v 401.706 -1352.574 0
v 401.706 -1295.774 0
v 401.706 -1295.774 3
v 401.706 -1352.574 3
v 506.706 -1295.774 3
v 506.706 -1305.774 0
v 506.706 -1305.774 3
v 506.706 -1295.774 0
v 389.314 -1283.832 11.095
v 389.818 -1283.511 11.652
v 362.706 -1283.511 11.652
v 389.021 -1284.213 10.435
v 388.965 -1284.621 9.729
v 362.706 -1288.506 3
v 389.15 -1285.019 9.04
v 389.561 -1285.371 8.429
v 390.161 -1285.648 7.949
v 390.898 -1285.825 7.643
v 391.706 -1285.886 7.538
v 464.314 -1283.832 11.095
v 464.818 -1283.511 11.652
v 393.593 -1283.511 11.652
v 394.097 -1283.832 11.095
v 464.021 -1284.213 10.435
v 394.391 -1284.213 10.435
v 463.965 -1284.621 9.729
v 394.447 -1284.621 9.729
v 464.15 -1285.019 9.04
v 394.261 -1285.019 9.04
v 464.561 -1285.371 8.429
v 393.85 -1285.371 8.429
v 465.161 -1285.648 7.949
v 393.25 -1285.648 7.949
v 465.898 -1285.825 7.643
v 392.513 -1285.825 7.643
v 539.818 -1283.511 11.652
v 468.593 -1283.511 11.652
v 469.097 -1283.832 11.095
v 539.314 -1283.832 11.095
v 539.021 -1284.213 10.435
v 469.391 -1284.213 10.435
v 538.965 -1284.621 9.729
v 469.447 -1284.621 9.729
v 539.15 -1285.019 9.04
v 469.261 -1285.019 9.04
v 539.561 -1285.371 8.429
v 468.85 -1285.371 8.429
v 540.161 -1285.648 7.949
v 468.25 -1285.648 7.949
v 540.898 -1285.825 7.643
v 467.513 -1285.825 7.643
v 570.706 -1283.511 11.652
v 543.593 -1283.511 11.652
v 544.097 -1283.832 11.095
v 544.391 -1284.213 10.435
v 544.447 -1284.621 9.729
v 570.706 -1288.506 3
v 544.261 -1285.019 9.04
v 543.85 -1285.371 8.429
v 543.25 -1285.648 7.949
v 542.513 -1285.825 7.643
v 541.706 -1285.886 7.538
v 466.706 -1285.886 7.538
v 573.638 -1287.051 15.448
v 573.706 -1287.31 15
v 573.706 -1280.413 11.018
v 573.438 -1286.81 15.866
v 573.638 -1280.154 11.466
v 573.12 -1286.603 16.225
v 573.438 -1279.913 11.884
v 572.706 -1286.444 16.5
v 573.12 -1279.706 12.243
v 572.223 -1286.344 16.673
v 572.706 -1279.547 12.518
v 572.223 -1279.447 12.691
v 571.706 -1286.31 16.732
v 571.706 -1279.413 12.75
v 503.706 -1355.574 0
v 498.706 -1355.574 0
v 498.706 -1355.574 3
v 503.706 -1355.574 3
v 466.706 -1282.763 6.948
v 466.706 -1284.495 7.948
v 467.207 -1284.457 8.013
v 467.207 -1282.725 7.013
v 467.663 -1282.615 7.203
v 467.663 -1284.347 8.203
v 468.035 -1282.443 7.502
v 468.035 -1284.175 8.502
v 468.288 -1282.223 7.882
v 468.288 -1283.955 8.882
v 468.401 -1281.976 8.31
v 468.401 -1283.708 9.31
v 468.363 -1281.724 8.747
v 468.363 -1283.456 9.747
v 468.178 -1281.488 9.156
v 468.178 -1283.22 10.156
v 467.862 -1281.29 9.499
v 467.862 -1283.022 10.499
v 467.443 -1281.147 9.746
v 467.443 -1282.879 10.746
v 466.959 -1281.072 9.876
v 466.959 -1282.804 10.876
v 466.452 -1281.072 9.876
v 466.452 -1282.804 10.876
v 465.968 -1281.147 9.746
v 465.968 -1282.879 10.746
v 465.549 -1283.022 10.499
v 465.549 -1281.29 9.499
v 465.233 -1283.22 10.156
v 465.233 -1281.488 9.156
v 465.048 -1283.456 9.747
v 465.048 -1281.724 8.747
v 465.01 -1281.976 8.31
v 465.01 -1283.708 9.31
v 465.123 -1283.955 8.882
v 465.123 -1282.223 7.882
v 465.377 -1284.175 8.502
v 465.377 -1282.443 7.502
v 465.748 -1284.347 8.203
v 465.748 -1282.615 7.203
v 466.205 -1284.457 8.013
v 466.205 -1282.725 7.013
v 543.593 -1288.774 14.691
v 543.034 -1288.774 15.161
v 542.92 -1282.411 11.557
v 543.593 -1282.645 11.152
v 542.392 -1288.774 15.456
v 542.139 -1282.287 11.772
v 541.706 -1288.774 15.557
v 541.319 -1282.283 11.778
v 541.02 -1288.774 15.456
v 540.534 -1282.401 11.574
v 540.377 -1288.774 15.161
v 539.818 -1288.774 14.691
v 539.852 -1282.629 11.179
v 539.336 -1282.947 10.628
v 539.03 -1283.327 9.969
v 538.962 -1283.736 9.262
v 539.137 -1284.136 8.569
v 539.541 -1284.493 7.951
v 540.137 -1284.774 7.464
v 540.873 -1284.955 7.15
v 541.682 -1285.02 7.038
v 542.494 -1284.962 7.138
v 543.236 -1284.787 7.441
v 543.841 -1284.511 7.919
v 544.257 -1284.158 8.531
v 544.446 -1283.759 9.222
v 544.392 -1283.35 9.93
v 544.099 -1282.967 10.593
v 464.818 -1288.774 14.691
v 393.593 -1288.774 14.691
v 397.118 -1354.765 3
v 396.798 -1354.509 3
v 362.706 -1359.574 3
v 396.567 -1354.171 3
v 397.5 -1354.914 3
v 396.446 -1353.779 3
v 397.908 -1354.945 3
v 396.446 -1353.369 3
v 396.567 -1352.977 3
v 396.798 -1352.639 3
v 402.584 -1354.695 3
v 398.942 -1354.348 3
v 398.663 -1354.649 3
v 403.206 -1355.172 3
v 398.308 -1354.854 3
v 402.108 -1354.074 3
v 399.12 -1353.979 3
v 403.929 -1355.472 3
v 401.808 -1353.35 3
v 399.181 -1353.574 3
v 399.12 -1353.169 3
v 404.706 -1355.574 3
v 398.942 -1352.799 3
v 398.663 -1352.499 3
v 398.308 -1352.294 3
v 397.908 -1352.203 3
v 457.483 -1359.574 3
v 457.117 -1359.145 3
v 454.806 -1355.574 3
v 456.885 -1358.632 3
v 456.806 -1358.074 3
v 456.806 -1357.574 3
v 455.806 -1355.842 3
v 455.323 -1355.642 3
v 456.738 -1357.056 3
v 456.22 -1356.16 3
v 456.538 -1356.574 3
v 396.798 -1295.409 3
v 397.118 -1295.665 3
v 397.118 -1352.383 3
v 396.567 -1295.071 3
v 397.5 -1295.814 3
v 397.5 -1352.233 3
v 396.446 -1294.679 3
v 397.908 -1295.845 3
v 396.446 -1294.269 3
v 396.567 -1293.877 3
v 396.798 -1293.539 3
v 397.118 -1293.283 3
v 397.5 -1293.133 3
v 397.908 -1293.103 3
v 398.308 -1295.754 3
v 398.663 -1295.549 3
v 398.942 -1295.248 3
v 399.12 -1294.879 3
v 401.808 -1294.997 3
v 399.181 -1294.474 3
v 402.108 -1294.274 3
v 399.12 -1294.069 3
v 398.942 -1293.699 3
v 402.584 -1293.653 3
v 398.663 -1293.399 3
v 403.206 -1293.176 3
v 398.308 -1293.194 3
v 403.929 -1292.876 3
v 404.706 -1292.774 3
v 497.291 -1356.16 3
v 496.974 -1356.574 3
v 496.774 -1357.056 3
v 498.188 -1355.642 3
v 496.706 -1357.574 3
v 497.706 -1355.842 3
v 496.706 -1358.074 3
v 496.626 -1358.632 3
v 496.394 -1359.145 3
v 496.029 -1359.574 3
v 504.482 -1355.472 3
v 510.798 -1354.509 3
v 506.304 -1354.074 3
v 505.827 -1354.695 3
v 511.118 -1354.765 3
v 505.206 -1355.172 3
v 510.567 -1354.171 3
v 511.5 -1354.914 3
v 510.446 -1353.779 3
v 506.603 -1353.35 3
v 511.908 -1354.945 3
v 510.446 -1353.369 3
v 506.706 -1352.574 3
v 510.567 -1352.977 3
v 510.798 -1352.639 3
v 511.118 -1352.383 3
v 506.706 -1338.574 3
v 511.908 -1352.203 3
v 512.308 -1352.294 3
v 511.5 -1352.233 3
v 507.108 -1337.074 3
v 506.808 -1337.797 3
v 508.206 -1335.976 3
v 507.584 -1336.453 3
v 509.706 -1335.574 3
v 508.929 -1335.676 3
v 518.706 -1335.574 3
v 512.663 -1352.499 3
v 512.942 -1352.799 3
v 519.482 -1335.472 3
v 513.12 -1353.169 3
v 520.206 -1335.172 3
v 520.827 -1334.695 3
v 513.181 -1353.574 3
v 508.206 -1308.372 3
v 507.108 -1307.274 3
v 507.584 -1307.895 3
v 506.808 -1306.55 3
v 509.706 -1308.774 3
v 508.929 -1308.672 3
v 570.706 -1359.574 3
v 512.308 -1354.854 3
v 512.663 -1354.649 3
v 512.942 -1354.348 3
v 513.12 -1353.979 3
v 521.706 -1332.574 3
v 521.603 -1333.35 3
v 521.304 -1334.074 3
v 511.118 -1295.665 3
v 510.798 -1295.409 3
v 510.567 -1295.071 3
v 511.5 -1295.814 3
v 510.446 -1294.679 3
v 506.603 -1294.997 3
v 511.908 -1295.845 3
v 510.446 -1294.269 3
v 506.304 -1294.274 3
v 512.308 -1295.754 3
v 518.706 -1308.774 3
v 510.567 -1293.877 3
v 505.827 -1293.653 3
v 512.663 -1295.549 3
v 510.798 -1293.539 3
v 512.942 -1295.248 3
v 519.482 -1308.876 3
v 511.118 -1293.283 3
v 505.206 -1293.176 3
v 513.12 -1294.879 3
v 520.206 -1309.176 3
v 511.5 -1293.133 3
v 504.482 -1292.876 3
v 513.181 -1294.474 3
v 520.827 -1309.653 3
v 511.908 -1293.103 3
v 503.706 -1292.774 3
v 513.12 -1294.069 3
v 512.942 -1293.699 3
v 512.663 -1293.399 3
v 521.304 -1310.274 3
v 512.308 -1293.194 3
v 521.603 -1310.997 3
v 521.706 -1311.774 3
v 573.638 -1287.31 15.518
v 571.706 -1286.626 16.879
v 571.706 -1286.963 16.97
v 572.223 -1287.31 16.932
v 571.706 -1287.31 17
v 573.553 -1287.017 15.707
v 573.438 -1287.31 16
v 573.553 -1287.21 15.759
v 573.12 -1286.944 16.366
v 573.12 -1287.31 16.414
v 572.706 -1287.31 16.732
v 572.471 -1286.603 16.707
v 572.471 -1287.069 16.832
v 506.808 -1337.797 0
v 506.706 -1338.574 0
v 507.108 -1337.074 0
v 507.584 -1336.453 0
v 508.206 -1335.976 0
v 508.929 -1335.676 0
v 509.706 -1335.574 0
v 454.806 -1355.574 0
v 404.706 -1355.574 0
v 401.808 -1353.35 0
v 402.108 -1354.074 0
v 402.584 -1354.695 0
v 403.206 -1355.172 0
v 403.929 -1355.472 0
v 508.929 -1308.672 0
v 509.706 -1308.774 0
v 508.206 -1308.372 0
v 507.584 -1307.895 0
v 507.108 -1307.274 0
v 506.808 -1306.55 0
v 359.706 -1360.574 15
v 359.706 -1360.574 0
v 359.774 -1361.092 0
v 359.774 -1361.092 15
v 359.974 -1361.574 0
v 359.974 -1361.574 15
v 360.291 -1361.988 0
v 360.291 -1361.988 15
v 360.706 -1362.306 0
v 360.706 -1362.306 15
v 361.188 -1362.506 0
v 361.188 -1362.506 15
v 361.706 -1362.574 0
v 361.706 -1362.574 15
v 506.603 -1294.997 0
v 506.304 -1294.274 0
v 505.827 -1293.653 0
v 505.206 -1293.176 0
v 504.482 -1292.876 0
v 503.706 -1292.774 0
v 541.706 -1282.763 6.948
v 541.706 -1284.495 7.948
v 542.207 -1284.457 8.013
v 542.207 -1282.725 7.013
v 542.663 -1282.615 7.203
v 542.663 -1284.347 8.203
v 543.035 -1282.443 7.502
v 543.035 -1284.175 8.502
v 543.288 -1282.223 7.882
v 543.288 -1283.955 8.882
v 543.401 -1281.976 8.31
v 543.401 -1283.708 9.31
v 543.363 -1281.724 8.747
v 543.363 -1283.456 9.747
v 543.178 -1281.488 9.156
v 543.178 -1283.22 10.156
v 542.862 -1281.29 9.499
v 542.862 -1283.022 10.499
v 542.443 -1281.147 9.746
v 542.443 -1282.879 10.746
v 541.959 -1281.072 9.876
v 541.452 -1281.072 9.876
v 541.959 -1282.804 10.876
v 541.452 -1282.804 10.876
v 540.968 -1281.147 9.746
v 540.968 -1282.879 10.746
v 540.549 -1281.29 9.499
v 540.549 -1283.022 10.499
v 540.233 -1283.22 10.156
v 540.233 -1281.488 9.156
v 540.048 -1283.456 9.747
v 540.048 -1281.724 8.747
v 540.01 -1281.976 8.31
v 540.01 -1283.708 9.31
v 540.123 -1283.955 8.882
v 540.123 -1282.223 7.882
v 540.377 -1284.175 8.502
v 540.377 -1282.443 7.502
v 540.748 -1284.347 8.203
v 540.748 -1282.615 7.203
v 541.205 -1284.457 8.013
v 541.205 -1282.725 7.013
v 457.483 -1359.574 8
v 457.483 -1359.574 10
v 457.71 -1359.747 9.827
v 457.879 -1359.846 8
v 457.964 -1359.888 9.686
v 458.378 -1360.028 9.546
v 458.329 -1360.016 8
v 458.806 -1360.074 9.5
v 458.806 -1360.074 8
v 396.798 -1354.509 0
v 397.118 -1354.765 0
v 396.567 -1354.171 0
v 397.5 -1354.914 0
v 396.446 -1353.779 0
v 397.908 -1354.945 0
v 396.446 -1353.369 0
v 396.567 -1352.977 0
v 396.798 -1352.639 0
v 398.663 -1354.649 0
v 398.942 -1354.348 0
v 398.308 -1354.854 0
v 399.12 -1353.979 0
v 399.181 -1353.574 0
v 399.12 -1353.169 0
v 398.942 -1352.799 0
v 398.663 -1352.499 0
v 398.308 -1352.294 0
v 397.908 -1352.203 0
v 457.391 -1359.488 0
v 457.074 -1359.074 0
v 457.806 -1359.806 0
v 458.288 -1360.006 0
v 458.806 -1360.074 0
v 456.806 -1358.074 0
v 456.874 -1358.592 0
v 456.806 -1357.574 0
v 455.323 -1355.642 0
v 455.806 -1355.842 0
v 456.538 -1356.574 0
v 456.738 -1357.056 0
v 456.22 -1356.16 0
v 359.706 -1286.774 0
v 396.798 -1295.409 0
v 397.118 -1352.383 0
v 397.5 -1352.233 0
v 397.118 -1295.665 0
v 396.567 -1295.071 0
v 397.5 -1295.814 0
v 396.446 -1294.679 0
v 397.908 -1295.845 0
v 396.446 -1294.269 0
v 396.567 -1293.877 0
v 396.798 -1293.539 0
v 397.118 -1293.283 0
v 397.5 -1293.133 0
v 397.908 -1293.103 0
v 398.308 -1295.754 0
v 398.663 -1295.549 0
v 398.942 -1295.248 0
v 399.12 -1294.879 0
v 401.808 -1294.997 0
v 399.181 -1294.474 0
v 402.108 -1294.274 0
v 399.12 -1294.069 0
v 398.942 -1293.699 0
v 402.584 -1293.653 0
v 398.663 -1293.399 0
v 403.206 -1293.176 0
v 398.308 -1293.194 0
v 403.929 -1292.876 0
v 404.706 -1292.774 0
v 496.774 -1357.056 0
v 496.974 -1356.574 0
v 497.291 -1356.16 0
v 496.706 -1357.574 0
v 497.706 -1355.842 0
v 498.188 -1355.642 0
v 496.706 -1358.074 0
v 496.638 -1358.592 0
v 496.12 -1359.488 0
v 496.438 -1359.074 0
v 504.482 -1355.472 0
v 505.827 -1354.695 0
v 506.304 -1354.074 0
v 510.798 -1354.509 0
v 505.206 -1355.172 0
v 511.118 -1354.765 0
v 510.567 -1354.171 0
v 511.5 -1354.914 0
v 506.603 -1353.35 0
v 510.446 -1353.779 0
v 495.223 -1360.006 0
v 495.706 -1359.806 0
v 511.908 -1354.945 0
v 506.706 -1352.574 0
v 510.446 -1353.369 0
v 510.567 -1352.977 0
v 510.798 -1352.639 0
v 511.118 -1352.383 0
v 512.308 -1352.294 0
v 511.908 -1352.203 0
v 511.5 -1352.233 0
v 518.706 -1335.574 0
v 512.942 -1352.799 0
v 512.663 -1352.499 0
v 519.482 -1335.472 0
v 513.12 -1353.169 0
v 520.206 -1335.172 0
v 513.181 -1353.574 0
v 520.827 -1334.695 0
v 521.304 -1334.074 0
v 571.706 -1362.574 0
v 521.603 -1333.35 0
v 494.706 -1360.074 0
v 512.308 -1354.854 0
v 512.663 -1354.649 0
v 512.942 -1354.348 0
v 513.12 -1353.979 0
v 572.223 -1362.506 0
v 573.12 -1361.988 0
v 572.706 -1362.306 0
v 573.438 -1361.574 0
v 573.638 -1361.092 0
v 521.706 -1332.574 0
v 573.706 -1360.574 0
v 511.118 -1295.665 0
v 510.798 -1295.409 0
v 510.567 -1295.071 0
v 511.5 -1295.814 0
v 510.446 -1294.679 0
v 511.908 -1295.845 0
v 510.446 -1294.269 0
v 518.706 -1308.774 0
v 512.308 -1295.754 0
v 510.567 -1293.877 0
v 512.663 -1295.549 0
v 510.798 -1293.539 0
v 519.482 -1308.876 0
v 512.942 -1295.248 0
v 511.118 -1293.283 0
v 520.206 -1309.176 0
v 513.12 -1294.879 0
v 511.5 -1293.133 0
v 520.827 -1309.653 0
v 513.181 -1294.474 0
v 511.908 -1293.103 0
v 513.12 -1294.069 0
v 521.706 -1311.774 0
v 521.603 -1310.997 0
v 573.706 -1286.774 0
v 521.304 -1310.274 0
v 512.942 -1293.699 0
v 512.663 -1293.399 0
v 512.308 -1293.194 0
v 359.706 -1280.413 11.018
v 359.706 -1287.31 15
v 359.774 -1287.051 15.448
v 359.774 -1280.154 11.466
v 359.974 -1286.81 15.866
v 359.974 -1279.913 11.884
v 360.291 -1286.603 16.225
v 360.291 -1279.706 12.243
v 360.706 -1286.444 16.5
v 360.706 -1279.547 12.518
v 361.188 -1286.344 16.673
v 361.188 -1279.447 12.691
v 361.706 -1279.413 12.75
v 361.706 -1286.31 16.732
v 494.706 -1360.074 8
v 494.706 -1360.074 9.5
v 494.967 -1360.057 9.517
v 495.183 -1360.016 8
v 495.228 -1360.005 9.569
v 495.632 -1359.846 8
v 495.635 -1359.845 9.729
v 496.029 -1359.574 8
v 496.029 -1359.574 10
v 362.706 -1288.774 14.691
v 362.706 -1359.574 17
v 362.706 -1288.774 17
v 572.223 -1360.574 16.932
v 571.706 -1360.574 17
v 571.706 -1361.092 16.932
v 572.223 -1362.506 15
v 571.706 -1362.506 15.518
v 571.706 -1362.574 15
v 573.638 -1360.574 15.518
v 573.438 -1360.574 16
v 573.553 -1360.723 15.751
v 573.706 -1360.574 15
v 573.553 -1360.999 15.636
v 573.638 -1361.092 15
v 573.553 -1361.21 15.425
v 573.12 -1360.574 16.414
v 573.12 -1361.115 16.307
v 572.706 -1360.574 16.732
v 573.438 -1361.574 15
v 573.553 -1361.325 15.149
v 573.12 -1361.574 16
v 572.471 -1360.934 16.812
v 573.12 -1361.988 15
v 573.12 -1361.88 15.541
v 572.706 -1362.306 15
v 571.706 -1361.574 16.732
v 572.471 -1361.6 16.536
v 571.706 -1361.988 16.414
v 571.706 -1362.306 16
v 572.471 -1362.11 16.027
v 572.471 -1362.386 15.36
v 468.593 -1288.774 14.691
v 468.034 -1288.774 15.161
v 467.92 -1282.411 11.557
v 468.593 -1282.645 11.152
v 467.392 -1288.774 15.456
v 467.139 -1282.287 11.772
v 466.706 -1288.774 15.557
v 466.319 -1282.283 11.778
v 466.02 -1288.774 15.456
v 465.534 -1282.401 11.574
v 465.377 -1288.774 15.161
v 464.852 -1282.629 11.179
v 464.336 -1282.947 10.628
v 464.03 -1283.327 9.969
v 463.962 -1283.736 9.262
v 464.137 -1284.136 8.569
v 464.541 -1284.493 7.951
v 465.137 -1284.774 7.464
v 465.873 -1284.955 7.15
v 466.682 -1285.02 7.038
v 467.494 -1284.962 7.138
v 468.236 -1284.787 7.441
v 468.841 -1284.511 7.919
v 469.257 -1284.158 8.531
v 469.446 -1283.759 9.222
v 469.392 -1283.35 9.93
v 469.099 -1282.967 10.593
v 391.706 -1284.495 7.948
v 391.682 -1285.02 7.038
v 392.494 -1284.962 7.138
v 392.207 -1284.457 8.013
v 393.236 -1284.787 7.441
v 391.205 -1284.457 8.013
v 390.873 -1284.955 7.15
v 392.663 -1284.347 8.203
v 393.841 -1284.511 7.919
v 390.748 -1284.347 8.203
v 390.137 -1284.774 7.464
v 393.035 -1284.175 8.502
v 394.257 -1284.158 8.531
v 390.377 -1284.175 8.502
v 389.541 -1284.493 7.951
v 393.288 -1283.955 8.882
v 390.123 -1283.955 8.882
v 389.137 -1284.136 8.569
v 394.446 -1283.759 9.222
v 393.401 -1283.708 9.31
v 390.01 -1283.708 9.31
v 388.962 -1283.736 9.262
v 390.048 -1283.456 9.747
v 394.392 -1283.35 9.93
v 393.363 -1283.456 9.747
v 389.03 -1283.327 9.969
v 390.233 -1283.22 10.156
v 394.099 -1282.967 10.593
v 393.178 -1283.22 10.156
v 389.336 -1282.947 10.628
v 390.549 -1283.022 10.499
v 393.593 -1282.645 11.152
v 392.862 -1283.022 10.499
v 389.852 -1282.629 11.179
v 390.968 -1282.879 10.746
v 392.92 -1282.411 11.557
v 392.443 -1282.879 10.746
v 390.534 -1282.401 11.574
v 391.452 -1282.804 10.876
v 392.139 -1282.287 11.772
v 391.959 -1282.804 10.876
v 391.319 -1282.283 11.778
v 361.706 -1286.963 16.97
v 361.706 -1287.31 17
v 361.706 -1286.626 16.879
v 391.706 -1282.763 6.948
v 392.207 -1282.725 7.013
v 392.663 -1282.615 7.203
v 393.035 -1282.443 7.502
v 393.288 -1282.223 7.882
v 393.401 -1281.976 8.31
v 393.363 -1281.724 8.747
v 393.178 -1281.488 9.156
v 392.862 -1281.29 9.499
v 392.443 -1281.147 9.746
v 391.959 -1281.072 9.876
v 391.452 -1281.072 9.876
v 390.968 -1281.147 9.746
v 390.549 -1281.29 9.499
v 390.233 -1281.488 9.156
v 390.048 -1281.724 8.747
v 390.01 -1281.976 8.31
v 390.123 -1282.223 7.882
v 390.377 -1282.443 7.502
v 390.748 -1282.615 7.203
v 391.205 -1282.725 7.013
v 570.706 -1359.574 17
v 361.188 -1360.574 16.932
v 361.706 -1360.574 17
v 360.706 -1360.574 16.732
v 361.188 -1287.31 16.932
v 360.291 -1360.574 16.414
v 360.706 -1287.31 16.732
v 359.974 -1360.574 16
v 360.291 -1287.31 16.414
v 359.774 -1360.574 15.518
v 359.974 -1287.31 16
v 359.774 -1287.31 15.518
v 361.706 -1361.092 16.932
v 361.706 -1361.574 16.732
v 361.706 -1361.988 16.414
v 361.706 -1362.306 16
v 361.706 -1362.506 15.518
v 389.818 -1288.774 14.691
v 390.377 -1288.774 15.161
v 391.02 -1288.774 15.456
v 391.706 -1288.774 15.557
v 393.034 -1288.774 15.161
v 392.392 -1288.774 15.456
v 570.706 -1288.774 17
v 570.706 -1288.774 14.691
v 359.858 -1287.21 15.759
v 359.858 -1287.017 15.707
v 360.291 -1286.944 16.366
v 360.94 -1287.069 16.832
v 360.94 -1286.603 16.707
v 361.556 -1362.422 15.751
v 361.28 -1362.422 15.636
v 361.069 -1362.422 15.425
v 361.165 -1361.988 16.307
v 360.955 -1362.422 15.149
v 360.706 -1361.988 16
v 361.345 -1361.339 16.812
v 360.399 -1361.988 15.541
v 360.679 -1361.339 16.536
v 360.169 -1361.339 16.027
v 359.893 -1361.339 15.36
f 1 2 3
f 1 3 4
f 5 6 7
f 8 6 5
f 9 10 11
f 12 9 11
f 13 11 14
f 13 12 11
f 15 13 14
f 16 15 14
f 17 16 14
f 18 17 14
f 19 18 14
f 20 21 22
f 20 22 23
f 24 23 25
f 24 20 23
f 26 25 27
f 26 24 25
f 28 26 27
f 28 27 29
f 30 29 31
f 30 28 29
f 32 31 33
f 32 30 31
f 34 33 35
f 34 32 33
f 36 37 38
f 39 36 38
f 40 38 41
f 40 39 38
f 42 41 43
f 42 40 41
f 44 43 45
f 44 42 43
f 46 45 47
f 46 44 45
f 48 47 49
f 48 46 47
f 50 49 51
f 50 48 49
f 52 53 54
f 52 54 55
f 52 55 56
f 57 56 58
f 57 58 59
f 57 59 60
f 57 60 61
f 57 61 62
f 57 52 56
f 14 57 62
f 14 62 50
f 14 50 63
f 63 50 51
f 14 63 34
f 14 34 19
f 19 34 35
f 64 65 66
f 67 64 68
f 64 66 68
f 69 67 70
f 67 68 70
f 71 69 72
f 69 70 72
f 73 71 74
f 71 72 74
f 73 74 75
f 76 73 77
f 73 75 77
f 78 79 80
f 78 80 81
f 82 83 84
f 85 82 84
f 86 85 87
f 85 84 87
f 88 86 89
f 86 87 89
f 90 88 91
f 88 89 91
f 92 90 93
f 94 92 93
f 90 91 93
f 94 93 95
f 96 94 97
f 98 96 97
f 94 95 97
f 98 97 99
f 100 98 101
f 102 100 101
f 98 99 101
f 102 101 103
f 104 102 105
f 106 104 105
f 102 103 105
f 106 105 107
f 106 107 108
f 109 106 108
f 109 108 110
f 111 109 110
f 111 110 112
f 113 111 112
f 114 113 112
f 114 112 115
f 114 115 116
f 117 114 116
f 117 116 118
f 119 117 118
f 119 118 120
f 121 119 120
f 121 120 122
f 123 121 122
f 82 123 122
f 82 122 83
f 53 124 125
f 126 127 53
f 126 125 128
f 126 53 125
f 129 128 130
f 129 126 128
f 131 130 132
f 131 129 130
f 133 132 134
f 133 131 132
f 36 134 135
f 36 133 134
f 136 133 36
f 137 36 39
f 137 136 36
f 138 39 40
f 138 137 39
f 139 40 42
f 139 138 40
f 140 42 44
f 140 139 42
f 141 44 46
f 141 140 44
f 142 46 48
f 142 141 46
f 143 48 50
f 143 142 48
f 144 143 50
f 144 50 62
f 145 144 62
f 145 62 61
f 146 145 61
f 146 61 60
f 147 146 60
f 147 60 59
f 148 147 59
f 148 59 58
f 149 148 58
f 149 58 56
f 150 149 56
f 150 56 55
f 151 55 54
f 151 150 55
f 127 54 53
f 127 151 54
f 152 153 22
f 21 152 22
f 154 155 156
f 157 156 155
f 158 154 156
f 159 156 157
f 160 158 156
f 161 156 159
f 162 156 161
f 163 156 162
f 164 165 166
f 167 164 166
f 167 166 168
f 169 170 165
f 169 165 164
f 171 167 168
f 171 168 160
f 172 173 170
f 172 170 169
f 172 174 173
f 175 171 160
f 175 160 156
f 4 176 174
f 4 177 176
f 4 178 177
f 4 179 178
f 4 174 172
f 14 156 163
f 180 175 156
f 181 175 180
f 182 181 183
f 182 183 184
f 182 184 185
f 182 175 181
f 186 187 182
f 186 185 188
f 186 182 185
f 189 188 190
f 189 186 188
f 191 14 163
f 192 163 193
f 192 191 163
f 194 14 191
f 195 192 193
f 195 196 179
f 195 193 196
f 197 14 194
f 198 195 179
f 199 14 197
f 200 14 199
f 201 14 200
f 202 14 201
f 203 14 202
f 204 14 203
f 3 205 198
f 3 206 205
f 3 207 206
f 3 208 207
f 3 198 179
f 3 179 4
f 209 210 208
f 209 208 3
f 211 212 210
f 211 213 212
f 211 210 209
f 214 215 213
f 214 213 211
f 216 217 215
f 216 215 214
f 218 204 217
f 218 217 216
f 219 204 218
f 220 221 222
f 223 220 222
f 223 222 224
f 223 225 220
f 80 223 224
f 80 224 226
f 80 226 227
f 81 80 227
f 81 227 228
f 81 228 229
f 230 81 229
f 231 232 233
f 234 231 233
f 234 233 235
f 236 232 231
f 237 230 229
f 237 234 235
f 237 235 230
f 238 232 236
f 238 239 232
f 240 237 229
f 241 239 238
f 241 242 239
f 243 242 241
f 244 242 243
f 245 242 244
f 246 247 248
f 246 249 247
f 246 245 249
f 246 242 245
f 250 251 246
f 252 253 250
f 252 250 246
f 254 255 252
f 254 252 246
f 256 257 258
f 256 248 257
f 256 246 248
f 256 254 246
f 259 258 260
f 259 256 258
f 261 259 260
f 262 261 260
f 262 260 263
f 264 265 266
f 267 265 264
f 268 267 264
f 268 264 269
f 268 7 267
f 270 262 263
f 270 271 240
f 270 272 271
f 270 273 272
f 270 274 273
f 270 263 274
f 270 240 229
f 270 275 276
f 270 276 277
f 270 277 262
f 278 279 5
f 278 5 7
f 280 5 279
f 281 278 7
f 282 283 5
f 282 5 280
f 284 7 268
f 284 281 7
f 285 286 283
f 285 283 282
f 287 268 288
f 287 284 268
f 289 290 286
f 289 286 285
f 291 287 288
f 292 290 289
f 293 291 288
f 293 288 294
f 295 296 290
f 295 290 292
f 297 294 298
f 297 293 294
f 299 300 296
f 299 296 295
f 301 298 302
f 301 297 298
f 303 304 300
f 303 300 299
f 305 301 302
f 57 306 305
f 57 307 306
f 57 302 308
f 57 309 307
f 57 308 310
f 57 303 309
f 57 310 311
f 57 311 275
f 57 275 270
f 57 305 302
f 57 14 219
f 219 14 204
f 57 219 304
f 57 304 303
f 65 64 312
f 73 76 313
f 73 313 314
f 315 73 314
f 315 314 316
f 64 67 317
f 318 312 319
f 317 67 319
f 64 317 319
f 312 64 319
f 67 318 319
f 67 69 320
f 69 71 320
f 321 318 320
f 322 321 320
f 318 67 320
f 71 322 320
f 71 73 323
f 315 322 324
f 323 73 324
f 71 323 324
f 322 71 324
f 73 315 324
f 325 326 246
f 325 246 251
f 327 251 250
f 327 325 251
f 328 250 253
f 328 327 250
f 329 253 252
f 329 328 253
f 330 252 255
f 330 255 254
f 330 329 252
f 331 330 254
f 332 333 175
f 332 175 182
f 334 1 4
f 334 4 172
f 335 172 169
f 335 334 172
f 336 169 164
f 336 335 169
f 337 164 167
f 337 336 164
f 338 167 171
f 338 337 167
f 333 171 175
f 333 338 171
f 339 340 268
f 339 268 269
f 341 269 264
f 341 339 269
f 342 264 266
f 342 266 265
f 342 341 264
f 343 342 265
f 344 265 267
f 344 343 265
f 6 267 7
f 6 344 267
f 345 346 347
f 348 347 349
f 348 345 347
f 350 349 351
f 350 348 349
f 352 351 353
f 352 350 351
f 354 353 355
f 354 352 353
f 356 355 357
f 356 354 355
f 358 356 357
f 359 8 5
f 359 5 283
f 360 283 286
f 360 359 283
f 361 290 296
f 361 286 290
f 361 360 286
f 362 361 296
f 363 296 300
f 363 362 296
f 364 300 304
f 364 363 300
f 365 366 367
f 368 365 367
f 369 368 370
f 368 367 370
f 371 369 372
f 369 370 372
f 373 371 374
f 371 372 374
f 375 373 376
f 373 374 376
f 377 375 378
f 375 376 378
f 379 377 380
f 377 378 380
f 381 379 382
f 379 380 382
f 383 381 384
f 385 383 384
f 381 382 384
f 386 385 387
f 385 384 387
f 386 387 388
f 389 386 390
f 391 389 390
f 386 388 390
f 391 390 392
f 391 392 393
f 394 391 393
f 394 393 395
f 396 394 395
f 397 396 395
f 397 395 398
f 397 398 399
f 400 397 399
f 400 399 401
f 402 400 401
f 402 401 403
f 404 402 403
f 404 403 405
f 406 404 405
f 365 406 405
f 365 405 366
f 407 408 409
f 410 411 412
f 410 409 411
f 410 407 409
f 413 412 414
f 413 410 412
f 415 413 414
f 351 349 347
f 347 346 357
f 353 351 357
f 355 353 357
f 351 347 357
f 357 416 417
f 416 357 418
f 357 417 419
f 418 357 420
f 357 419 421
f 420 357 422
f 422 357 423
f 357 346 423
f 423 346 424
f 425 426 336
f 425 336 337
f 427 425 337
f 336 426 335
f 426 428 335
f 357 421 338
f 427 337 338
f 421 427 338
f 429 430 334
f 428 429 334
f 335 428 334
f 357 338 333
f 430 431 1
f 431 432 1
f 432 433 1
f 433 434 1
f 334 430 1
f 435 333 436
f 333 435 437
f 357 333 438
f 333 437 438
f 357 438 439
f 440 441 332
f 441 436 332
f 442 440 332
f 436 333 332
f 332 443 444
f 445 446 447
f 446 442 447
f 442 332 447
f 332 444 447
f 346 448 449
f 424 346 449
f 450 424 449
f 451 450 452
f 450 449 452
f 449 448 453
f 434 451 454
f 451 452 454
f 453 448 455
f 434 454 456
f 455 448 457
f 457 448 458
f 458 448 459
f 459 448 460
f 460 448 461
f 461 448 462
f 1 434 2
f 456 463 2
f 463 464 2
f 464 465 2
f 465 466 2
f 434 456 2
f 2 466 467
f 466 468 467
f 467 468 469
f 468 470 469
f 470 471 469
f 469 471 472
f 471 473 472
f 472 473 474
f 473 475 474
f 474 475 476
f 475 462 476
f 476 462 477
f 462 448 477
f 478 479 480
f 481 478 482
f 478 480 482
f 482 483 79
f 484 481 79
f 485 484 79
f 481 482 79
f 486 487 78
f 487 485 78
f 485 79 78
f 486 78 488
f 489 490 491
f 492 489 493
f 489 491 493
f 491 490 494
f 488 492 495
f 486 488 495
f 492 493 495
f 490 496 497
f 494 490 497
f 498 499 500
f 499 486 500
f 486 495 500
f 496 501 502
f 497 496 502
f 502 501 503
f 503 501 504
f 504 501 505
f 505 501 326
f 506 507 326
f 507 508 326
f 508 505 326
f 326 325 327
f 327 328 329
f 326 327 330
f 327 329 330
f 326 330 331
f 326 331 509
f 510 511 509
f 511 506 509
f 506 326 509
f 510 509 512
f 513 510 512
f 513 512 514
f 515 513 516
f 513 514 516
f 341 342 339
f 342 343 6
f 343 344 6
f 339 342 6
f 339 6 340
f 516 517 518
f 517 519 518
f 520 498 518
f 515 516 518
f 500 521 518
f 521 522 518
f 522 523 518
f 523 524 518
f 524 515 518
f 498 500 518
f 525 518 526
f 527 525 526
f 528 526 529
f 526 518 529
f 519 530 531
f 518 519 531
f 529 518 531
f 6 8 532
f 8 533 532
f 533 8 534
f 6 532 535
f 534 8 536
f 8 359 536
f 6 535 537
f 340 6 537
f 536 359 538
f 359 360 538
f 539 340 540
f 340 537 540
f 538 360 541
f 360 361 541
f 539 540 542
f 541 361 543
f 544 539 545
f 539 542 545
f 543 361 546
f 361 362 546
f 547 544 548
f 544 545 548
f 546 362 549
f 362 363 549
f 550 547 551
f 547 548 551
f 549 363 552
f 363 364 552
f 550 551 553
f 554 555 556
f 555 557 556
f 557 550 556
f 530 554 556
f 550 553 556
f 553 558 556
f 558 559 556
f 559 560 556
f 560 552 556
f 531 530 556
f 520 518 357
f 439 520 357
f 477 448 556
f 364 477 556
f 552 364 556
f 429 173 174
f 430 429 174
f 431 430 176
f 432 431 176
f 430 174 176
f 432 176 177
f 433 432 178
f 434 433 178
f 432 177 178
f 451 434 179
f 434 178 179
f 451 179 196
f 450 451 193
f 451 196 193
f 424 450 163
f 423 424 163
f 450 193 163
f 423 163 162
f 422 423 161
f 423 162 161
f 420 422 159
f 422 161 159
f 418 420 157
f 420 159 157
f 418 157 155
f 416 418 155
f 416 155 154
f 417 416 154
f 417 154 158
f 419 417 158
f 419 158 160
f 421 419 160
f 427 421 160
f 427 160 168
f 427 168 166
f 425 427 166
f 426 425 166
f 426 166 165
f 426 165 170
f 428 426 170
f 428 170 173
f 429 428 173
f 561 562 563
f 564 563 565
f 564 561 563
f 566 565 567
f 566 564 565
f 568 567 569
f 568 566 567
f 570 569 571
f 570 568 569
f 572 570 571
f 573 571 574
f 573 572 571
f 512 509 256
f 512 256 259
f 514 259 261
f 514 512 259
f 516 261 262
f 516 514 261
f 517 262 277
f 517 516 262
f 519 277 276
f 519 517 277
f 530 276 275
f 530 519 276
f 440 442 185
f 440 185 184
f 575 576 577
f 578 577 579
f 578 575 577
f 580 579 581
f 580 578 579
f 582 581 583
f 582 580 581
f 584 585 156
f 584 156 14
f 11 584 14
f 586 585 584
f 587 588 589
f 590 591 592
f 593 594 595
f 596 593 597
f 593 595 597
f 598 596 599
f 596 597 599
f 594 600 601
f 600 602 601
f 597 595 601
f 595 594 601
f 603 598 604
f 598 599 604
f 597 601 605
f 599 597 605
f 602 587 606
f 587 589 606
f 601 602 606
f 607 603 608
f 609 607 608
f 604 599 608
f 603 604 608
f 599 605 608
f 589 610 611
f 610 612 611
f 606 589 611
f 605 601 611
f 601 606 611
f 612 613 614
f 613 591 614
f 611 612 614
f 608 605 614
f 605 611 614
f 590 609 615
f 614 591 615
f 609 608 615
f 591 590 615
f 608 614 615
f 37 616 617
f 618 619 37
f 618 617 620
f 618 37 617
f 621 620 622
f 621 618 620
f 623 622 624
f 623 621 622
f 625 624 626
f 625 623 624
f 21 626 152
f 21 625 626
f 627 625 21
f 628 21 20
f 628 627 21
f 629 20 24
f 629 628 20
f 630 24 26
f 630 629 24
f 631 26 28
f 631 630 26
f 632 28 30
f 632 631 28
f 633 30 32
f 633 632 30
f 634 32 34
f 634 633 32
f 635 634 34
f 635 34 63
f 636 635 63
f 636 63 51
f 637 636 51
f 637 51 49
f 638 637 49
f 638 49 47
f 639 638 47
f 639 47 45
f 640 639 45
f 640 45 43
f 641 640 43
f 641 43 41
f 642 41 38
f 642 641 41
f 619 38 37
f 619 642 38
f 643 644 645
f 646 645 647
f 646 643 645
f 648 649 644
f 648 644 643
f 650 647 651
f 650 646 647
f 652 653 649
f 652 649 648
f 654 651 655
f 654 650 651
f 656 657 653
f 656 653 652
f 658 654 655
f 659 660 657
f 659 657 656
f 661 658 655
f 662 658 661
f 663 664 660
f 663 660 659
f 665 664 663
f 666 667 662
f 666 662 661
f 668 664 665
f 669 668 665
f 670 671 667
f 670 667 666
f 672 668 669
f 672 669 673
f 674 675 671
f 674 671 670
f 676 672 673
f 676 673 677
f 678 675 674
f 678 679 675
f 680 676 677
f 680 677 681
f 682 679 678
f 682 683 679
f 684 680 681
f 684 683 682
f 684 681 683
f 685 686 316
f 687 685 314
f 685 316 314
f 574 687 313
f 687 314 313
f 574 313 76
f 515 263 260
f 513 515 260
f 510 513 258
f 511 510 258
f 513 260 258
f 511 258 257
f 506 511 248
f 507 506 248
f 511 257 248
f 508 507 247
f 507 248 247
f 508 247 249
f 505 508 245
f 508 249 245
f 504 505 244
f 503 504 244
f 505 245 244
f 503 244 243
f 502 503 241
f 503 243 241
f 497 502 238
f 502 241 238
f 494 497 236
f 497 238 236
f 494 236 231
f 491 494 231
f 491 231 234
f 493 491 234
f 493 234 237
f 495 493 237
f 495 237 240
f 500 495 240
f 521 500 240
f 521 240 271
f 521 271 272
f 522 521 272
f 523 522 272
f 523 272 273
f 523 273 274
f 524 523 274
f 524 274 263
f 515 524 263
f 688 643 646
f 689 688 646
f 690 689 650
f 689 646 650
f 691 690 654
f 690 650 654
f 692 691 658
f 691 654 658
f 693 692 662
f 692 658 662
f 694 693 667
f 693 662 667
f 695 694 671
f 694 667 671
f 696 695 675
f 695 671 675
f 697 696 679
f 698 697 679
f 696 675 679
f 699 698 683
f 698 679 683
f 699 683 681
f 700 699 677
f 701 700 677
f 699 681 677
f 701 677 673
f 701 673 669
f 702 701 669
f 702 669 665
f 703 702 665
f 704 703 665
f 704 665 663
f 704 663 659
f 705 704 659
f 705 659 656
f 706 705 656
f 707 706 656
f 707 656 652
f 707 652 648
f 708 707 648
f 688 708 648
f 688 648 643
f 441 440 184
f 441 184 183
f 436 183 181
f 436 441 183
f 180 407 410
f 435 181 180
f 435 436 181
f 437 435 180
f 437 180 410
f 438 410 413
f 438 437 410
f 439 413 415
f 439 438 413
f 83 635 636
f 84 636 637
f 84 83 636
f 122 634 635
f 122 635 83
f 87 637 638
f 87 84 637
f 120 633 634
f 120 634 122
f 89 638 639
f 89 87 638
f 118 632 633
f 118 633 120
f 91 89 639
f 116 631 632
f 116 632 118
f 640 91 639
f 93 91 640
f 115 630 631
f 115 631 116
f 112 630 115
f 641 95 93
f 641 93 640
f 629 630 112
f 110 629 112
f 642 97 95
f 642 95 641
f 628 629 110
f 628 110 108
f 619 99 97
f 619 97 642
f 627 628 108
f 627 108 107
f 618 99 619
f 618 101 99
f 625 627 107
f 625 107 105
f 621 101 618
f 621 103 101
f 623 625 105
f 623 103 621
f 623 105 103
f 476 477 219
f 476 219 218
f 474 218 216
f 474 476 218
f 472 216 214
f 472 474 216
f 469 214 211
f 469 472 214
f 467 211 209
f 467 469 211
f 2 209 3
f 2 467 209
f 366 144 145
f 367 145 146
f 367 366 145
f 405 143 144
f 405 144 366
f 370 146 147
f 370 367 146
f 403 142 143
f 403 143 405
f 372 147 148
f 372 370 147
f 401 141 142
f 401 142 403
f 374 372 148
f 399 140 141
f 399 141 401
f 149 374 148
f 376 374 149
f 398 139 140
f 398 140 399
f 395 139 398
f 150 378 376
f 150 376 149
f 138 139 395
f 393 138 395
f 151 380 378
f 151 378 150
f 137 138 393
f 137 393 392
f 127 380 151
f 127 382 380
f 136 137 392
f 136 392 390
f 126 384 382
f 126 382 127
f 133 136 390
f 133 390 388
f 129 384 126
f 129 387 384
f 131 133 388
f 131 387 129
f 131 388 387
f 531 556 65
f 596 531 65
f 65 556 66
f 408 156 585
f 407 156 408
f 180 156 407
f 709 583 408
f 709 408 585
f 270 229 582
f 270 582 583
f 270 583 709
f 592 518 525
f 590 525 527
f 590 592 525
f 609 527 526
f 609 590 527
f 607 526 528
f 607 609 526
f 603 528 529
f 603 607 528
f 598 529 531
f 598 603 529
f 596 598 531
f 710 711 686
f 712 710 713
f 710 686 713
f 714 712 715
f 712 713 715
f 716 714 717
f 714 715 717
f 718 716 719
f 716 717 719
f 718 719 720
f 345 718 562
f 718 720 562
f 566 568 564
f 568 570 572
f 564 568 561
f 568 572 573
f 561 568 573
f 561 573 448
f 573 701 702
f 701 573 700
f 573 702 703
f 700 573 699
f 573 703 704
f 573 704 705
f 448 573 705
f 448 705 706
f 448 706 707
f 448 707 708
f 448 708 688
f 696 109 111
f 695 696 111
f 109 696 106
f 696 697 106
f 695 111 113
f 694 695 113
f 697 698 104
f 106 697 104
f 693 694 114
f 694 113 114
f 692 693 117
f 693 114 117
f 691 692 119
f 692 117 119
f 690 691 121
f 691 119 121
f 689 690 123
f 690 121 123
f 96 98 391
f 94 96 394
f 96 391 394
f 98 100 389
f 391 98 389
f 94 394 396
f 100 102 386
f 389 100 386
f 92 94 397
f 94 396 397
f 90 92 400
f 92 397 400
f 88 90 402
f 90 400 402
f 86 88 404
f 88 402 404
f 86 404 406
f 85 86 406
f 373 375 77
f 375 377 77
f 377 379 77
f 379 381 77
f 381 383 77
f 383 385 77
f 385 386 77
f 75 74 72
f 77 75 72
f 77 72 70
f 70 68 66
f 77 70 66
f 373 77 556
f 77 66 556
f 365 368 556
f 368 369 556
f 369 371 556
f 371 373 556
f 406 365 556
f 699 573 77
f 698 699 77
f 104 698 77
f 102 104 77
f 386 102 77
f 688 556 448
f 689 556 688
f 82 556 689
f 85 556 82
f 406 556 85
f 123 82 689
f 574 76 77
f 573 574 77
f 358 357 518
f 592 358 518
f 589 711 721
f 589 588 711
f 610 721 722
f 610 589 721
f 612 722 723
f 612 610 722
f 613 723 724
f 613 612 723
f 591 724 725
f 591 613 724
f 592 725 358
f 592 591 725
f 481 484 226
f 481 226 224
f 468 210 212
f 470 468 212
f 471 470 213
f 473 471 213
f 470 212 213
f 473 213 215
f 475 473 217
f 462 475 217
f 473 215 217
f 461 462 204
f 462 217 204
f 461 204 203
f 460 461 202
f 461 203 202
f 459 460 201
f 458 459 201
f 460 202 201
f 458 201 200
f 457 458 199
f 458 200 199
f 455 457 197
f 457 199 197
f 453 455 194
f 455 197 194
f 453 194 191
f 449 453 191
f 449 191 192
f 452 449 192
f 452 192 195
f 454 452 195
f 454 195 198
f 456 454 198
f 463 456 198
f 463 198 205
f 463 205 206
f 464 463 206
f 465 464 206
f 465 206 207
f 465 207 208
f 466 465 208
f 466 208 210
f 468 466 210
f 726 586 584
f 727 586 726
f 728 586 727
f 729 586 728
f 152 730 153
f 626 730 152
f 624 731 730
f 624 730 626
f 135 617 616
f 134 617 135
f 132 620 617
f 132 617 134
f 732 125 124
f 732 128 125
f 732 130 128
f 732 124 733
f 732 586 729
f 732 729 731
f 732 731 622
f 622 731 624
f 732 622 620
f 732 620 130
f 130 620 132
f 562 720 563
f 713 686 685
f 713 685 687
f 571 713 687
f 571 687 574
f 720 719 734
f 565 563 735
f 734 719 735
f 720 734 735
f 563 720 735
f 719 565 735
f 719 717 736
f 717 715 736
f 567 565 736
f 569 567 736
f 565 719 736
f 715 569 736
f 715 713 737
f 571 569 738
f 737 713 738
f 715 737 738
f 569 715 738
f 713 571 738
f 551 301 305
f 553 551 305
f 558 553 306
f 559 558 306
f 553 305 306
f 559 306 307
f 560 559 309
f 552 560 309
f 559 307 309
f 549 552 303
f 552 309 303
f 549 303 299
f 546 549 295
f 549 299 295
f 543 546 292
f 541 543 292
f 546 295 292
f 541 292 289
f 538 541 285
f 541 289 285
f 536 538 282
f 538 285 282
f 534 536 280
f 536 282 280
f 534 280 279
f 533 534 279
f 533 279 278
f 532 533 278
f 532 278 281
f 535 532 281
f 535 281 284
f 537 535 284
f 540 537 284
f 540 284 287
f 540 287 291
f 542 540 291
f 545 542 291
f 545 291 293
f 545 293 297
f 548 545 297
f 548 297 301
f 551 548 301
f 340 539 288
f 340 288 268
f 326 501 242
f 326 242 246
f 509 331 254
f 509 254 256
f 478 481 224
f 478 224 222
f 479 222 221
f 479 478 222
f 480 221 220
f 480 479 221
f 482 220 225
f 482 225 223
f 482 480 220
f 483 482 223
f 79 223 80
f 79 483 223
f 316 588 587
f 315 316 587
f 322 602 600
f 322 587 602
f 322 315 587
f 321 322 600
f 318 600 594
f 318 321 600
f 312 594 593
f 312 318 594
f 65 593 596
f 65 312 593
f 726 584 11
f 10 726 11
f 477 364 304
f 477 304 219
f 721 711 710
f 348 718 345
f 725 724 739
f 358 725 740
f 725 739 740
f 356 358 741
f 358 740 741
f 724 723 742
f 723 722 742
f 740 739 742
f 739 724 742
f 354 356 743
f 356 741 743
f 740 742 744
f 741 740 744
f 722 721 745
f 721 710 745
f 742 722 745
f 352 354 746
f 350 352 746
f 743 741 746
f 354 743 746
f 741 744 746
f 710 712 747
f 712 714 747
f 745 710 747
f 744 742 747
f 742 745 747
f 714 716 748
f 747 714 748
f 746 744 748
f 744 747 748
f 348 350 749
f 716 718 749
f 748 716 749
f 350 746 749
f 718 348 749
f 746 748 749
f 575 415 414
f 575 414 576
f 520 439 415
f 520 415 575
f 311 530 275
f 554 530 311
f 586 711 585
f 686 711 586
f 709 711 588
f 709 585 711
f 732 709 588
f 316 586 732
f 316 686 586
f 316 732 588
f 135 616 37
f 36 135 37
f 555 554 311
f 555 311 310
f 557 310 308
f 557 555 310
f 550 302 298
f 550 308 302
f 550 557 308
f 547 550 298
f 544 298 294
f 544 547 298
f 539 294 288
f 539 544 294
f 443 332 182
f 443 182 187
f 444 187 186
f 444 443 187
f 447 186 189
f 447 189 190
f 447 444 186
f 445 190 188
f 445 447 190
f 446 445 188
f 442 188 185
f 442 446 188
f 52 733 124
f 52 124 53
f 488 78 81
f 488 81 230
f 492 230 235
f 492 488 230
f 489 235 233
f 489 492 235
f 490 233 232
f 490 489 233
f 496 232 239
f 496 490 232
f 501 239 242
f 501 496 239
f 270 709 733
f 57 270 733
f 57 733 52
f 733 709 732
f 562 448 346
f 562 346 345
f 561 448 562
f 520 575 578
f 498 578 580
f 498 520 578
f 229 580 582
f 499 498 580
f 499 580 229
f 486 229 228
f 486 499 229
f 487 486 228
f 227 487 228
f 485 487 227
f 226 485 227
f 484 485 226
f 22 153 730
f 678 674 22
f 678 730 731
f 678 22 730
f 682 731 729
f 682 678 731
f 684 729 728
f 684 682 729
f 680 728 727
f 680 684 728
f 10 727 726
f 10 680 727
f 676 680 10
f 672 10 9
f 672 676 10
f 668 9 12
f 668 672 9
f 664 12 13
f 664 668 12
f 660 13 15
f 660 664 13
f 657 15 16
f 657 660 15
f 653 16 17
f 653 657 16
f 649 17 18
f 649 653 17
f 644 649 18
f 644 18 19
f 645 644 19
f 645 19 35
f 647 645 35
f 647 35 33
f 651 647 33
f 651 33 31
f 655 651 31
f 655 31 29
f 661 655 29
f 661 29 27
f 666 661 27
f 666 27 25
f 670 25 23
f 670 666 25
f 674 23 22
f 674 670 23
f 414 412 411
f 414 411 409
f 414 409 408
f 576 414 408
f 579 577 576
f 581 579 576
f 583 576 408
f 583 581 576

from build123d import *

# Parameters (mm, degrees)
SKETCH1_W               = 214
SKETCH1_H               = 75.8
BOSS_EXTRUDE1_DEPTH     = 17
BOSSEXTENTION_DEPTH     = 214
SHELLIT_T               = -3
SKETCH7_W               = 208
SKETCH7_H               = 4
CUT_EXTRUDE4_DEPTH      = 3
SKETCH3_R               = 1.375
MOUNTING_HOLES_DEPTH    = 1479.493115905
PI_HOLE_DEPTH           = 8
CHAMFER1_START          = 8
CHAMFER1_DEPTH          = 2
CHAMFER1_START_2        = -970
CHAMFER1_2_DEPTH        = 1.564999152
FILLET1_R               = 2
SKETCH11_R              = 1.7
CUT_EXTRUDE5_DEPTH      = 893.868694268
CUT_EXTRUDE6_DEPTH      = 893.868694268
CUT_EXTRUDE6_DEPTH_BACK = 1
SKETCH12_R              = 2.75


with BuildPart() as part:
    # Sketch1 → Boss-Extrude1 (new body)
    with BuildSketch(Plane.XY):
        with Locations((466.705697041, -1324.673912477)):
            Rectangle(SKETCH1_W, SKETCH1_H)
    extrude(amount=BOSS_EXTRUDE1_DEPTH)

    # Sketch6 → BossExtention (add)
    with BuildSketch(Plane(origin=(573.705697041, 0, 0), x_dir=(0, 0, -1), z_dir=(1, 0, 0))):
        Polygon((-17, -1286.773912477), (-12.75, -1279.412696544), (0, -1286.773912477), align=None)
    extrude(amount=-BOSSEXTENTION_DEPTH)

    # Shellit
    shellit_openings = [part.faces().sort_by_distance(p)[0] for p in [
        (466.705697041, -1324.673912477, 17),
    ]]
    offset(amount=SHELLIT_T, openings=shellit_openings, kind=Kind.INTERSECTION)

    # Sketch7 → Cut-Extrude4 (cut)
    with BuildSketch(Plane.XY.offset(17)):
        with Locations((466.705697041, -1290.773912477)):
            Rectangle(SKETCH7_W, SKETCH7_H)
    extrude(amount=-CUT_EXTRUDE4_DEPTH, mode=Mode.SUBTRACT)

    # Sketch3 → Mounting Holes (cut, through all)
    with BuildSketch(Plane.XY.offset(3)):
        with Locations((397.805697041, -1294.473912477)):
            Circle(SKETCH3_R)
        with Locations((511.805697041, -1294.473912477)):
            Circle(SKETCH3_R)
        with Locations((397.805697041, -1353.573912477)):
            Circle(SKETCH3_R)
        with Locations((511.805697041, -1353.573912477)):
            Circle(SKETCH3_R)
    extrude(amount=-MOUNTING_HOLES_DEPTH, mode=Mode.SUBTRACT)

    # Sketch4 → PI_Hole (cut)
    with BuildSketch(Plane(origin=(0, 0, 0), x_dir=(-1, 0, 0), z_dir=(0, 0, -1))):
        with BuildLine():
            Line((-404.705697041, -1355.573912477), (-454.805697041, -1355.573912477))
            ThreePointArc((-454.805697041, -1355.573912477), (-456.219910604, -1356.159698914), (-456.805697041, -1357.573912477))
            Line((-456.805697041, -1357.573912477), (-456.805697041, -1358.073912477))
            ThreePointArc((-456.805697041, -1358.073912477), (-457.391483479, -1359.488126039), (-458.805697041, -1360.073912477))
            Line((-458.805697041, -1360.073912477), (-494.705697041, -1360.073912477))
            ThreePointArc((-494.705697041, -1360.073912477), (-496.119910604, -1359.488126039), (-496.705697041, -1358.073912477))
            Line((-496.705697041, -1358.073912477), (-496.705697041, -1357.573912477))
            ThreePointArc((-496.705697041, -1357.573912477), (-497.291483479, -1356.159698914), (-498.705697041, -1355.573912477))
            Line((-498.705697041, -1355.573912477), (-503.705697041, -1355.573912477))
            ThreePointArc((-503.705697041, -1355.573912477), (-505.827017385, -1354.69523282), (-506.705697041, -1352.573912477))
            Line((-506.705697041, -1352.573912477), (-506.705697041, -1338.573912477))
            ThreePointArc((-506.705697041, -1338.573912477), (-507.584376698, -1336.452592133), (-509.705697041, -1335.573912477))
            Line((-509.705697041, -1335.573912477), (-518.705697041, -1335.573912477))
            ThreePointArc((-518.705697041, -1335.573912477), (-520.827017385, -1334.69523282), (-521.705697041, -1332.573912477))
            Line((-521.705697041, -1332.573912477), (-521.705697041, -1311.773912477))
            ThreePointArc((-521.705697041, -1311.773912477), (-520.827017385, -1309.652592133), (-518.705697041, -1308.773912477))
            Line((-518.705697041, -1308.773912477), (-509.705697041, -1308.773912477))
            ThreePointArc((-509.705697041, -1308.773912477), (-507.584376698, -1307.89523282), (-506.705697041, -1305.773912477))
            Line((-506.705697041, -1305.773912477), (-506.705697041, -1295.773912477))
            ThreePointArc((-506.705697041, -1295.773912477), (-505.827017385, -1293.652592133), (-503.705697041, -1292.773912477))
            Line((-503.705697041, -1292.773912477), (-404.705697041, -1292.773912477))
            ThreePointArc((-404.705697041, -1292.773912477), (-402.584376698, -1293.652592133), (-401.705697041, -1295.773912477))
            Line((-401.705697041, -1295.773912477), (-401.705697041, -1352.573912477))
            ThreePointArc((-401.705697041, -1352.573912477), (-402.584376698, -1354.69523282), (-404.705697041, -1355.573912477))
        make_face()
    extrude(amount=-PI_HOLE_DEPTH, mode=Mode.SUBTRACT)

    # Chamfer1: read off the stored shape, not the designer's step
    # Chamfer1 outline → Chamfer1 (cut)
    with BuildSketch(Plane.XY.offset(CHAMFER1_START)):
        with BuildLine():
            ThreePointArc((457.482821386, -1359.573912477), (458.09859026, -1359.94474117), (458.805697041, -1360.073912477))
            Line((458.805697041, -1360.073912477), (494.705697041, -1360.073912477))
            ThreePointArc((494.705697041, -1360.073912477), (495.412803822, -1359.94474117), (496.028572697, -1359.573912477))
            Line((496.028572697, -1359.573912477), (457.482821386, -1359.573912477))
        make_face()
    extrude(amount=CHAMFER1_DEPTH, mode=Mode.SUBTRACT)

    # Chamfer1 2 outline → Chamfer1 2 (add)
    with BuildSketch(Plane(origin=(0, 0, 0), x_dir=(1, 0, 0), z_dir=(0, 0.70710678118655, -0.707106781186545)).offset(CHAMFER1_START_2)):
        with BuildLine():
            Line((494.705697041, 954.999972006), (458.805697041, 954.999972006))
            add(Edge.make_bspline(
                [(458.805697041, 954.999972006), (458.049768095, 954.999972006), (457.482821386, 954.292865225)],
                knots=[0, 0, 0, 0.722734248, 0.722734248, 0.722734248], degree=2, weights=[1, 0.935414347, 1]))
            Line((457.482821386, 954.292865225), (496.028572697, 954.292865225))
            add(Edge.make_bspline(
                [(496.028572697, 954.292865225), (495.461625987, 954.999972006), (494.705697041, 954.999972006)],
                knots=[5.560451059, 5.560451059, 5.560451059, 6.283185307, 6.283185307, 6.283185307], degree=2, weights=[1, 0.935414347, 1]))
        make_face()
    extrude(amount=CHAMFER1_2_DEPTH)

    # Fillet1
    fillet1_edges = [part.edges().sort_by_distance(p)[0] for p in [
        (359.705697041, -1324.673912477, 17),
        (573.705697041, -1283.09330451, 14.875),
        (359.705697041, -1283.09330451, 14.875),
        (466.705697041, -1362.573912477, 17),
        (573.705697041, -1324.673912477, 17),
        (573.705697041, -1362.573912477, 8.5),
        (359.705697041, -1362.573912477, 8.5),
        (466.705697041, -1286.773912477, 17),
    ]]
    fillet(fillet1_edges, radius=FILLET1_R)

    # Sketch11 → Cut-Extrude5 (cut, through all)
    with BuildSketch(Plane(origin=(0, -967.678510569, 558.689448566), x_dir=(1, 0, 0), z_dir=(0, -0.8660254037844403, 0.499999999999997))):
        with Locations(Location((466.705697041, -633.664524374, 0), (0, 0, 270))):
            Circle(SKETCH11_R)
        with Locations(Location((541.705697041, -633.664524374, 0), (0, 0, 270))):
            Circle(SKETCH11_R)
        with Locations(Location((391.705697041, -633.664524374, 0), (0, 0, 270))):
            Circle(SKETCH11_R)
    extrude(amount=-CUT_EXTRUDE5_DEPTH, mode=Mode.SUBTRACT)

    # Sketch12 → Cut-Extrude6 (cut, two sides: drawn at the far end of the back side and taken through both)
    with BuildSketch(Plane(origin=(0, -967.678510569, 558.689448566), x_dir=(1, 0, 0), z_dir=(0, -0.8660254037844403, 0.499999999999997)).offset(-CUT_EXTRUDE6_DEPTH_BACK)):
        with Locations(Location((391.705697041, -633.664524374, 0), (0, 0, 46.658241773))):
            Circle(SKETCH12_R)
        with Locations(Location((466.705697041, -633.664524374, 0), (0, 0, 46.658241773))):
            Circle(SKETCH12_R)
        with Locations(Location((541.705697041, -633.664524374, 0), (0, 0, 46.658241773))):
            Circle(SKETCH12_R)
    extrude(amount=CUT_EXTRUDE6_DEPTH + CUT_EXTRUDE6_DEPTH_BACK, mode=Mode.SUBTRACT)


solid = part.part
